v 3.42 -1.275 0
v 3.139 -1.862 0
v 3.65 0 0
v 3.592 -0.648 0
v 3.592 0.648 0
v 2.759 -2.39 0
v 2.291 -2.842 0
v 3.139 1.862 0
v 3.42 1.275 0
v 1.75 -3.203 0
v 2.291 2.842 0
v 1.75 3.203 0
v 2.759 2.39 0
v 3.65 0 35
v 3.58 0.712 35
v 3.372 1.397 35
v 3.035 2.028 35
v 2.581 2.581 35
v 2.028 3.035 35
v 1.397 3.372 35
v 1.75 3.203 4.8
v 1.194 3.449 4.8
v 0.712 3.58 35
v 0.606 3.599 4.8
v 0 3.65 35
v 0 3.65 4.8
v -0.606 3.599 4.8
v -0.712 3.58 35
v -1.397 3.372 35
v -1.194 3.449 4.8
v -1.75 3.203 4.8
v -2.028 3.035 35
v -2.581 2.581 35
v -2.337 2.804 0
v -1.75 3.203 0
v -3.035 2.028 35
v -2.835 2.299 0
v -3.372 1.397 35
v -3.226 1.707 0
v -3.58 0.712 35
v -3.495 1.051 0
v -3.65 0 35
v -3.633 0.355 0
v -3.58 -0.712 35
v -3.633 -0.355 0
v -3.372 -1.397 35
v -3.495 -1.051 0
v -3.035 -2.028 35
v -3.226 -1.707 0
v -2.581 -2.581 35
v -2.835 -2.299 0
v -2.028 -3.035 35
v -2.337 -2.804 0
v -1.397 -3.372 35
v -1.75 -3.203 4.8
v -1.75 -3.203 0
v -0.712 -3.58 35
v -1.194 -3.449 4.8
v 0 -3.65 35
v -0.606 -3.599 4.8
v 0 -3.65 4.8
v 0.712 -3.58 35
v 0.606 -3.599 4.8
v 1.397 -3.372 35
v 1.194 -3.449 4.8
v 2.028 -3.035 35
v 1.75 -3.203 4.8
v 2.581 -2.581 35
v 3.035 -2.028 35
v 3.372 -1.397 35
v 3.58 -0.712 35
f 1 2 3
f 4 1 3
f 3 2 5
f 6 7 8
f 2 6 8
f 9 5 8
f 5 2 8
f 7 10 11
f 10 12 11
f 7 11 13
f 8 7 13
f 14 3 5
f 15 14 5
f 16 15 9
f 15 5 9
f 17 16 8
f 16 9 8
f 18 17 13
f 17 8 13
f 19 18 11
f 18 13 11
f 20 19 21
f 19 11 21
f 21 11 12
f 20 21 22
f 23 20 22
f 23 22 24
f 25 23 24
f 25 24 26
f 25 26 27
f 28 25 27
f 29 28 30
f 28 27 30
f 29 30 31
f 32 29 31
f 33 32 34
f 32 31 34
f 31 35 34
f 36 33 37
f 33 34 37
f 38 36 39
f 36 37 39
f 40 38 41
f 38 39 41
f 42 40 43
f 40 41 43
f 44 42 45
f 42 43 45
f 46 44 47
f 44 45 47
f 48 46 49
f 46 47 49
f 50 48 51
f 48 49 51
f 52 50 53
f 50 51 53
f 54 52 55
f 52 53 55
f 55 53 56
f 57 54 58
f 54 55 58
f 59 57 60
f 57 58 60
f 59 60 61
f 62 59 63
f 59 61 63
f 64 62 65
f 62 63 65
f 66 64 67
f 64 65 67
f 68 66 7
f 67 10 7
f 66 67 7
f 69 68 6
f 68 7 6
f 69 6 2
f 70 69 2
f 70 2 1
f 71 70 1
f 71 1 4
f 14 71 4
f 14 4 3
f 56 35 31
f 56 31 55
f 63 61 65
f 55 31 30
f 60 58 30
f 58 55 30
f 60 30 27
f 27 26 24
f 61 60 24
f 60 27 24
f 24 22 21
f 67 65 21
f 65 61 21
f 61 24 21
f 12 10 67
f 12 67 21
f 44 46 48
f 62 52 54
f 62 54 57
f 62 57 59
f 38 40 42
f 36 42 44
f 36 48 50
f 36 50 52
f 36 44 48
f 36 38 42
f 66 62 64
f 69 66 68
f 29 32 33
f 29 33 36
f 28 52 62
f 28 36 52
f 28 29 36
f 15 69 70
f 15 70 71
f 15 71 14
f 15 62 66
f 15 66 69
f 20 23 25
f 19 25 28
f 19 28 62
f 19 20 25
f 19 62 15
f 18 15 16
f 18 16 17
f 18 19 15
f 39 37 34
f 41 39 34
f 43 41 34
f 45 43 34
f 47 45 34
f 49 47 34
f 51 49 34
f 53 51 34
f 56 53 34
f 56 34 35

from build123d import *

# Parameters (mm, degrees)
ESQUISSE1_R             = 3.65
BOSS_EXTRU_1_DEPTH      = 35
ENL_V_MAT_EXTRU_1_DEPTH = 4.8


with BuildPart() as part:
    # Esquisse1 → Boss.-Extru.1 (new body)
    with BuildSketch(Plane.XY):
        Circle(ESQUISSE1_R)
    extrude(amount=BOSS_EXTRU_1_DEPTH)

    # Esquisse2 → Enlèv. mat.-Extru.1 (cut)
    with BuildSketch(Plane(origin=(0, 0, 0), x_dir=(-1, 0, 0), z_dir=(0, 0, -1))):
        with BuildLine():
            Line((1.75, 4), (1.75, -4))
            ThreePointArc((1.75, -4), (0, -5.75), (-1.75, -4))
            Line((-1.75, -4), (-1.75, 4))
            ThreePointArc((-1.75, 4), (0, 5.75), (1.75, 4))
        make_face()
    extrude(amount=-ENL_V_MAT_EXTRU_1_DEPTH, mode=Mode.SUBTRACT)


solid = part.part
